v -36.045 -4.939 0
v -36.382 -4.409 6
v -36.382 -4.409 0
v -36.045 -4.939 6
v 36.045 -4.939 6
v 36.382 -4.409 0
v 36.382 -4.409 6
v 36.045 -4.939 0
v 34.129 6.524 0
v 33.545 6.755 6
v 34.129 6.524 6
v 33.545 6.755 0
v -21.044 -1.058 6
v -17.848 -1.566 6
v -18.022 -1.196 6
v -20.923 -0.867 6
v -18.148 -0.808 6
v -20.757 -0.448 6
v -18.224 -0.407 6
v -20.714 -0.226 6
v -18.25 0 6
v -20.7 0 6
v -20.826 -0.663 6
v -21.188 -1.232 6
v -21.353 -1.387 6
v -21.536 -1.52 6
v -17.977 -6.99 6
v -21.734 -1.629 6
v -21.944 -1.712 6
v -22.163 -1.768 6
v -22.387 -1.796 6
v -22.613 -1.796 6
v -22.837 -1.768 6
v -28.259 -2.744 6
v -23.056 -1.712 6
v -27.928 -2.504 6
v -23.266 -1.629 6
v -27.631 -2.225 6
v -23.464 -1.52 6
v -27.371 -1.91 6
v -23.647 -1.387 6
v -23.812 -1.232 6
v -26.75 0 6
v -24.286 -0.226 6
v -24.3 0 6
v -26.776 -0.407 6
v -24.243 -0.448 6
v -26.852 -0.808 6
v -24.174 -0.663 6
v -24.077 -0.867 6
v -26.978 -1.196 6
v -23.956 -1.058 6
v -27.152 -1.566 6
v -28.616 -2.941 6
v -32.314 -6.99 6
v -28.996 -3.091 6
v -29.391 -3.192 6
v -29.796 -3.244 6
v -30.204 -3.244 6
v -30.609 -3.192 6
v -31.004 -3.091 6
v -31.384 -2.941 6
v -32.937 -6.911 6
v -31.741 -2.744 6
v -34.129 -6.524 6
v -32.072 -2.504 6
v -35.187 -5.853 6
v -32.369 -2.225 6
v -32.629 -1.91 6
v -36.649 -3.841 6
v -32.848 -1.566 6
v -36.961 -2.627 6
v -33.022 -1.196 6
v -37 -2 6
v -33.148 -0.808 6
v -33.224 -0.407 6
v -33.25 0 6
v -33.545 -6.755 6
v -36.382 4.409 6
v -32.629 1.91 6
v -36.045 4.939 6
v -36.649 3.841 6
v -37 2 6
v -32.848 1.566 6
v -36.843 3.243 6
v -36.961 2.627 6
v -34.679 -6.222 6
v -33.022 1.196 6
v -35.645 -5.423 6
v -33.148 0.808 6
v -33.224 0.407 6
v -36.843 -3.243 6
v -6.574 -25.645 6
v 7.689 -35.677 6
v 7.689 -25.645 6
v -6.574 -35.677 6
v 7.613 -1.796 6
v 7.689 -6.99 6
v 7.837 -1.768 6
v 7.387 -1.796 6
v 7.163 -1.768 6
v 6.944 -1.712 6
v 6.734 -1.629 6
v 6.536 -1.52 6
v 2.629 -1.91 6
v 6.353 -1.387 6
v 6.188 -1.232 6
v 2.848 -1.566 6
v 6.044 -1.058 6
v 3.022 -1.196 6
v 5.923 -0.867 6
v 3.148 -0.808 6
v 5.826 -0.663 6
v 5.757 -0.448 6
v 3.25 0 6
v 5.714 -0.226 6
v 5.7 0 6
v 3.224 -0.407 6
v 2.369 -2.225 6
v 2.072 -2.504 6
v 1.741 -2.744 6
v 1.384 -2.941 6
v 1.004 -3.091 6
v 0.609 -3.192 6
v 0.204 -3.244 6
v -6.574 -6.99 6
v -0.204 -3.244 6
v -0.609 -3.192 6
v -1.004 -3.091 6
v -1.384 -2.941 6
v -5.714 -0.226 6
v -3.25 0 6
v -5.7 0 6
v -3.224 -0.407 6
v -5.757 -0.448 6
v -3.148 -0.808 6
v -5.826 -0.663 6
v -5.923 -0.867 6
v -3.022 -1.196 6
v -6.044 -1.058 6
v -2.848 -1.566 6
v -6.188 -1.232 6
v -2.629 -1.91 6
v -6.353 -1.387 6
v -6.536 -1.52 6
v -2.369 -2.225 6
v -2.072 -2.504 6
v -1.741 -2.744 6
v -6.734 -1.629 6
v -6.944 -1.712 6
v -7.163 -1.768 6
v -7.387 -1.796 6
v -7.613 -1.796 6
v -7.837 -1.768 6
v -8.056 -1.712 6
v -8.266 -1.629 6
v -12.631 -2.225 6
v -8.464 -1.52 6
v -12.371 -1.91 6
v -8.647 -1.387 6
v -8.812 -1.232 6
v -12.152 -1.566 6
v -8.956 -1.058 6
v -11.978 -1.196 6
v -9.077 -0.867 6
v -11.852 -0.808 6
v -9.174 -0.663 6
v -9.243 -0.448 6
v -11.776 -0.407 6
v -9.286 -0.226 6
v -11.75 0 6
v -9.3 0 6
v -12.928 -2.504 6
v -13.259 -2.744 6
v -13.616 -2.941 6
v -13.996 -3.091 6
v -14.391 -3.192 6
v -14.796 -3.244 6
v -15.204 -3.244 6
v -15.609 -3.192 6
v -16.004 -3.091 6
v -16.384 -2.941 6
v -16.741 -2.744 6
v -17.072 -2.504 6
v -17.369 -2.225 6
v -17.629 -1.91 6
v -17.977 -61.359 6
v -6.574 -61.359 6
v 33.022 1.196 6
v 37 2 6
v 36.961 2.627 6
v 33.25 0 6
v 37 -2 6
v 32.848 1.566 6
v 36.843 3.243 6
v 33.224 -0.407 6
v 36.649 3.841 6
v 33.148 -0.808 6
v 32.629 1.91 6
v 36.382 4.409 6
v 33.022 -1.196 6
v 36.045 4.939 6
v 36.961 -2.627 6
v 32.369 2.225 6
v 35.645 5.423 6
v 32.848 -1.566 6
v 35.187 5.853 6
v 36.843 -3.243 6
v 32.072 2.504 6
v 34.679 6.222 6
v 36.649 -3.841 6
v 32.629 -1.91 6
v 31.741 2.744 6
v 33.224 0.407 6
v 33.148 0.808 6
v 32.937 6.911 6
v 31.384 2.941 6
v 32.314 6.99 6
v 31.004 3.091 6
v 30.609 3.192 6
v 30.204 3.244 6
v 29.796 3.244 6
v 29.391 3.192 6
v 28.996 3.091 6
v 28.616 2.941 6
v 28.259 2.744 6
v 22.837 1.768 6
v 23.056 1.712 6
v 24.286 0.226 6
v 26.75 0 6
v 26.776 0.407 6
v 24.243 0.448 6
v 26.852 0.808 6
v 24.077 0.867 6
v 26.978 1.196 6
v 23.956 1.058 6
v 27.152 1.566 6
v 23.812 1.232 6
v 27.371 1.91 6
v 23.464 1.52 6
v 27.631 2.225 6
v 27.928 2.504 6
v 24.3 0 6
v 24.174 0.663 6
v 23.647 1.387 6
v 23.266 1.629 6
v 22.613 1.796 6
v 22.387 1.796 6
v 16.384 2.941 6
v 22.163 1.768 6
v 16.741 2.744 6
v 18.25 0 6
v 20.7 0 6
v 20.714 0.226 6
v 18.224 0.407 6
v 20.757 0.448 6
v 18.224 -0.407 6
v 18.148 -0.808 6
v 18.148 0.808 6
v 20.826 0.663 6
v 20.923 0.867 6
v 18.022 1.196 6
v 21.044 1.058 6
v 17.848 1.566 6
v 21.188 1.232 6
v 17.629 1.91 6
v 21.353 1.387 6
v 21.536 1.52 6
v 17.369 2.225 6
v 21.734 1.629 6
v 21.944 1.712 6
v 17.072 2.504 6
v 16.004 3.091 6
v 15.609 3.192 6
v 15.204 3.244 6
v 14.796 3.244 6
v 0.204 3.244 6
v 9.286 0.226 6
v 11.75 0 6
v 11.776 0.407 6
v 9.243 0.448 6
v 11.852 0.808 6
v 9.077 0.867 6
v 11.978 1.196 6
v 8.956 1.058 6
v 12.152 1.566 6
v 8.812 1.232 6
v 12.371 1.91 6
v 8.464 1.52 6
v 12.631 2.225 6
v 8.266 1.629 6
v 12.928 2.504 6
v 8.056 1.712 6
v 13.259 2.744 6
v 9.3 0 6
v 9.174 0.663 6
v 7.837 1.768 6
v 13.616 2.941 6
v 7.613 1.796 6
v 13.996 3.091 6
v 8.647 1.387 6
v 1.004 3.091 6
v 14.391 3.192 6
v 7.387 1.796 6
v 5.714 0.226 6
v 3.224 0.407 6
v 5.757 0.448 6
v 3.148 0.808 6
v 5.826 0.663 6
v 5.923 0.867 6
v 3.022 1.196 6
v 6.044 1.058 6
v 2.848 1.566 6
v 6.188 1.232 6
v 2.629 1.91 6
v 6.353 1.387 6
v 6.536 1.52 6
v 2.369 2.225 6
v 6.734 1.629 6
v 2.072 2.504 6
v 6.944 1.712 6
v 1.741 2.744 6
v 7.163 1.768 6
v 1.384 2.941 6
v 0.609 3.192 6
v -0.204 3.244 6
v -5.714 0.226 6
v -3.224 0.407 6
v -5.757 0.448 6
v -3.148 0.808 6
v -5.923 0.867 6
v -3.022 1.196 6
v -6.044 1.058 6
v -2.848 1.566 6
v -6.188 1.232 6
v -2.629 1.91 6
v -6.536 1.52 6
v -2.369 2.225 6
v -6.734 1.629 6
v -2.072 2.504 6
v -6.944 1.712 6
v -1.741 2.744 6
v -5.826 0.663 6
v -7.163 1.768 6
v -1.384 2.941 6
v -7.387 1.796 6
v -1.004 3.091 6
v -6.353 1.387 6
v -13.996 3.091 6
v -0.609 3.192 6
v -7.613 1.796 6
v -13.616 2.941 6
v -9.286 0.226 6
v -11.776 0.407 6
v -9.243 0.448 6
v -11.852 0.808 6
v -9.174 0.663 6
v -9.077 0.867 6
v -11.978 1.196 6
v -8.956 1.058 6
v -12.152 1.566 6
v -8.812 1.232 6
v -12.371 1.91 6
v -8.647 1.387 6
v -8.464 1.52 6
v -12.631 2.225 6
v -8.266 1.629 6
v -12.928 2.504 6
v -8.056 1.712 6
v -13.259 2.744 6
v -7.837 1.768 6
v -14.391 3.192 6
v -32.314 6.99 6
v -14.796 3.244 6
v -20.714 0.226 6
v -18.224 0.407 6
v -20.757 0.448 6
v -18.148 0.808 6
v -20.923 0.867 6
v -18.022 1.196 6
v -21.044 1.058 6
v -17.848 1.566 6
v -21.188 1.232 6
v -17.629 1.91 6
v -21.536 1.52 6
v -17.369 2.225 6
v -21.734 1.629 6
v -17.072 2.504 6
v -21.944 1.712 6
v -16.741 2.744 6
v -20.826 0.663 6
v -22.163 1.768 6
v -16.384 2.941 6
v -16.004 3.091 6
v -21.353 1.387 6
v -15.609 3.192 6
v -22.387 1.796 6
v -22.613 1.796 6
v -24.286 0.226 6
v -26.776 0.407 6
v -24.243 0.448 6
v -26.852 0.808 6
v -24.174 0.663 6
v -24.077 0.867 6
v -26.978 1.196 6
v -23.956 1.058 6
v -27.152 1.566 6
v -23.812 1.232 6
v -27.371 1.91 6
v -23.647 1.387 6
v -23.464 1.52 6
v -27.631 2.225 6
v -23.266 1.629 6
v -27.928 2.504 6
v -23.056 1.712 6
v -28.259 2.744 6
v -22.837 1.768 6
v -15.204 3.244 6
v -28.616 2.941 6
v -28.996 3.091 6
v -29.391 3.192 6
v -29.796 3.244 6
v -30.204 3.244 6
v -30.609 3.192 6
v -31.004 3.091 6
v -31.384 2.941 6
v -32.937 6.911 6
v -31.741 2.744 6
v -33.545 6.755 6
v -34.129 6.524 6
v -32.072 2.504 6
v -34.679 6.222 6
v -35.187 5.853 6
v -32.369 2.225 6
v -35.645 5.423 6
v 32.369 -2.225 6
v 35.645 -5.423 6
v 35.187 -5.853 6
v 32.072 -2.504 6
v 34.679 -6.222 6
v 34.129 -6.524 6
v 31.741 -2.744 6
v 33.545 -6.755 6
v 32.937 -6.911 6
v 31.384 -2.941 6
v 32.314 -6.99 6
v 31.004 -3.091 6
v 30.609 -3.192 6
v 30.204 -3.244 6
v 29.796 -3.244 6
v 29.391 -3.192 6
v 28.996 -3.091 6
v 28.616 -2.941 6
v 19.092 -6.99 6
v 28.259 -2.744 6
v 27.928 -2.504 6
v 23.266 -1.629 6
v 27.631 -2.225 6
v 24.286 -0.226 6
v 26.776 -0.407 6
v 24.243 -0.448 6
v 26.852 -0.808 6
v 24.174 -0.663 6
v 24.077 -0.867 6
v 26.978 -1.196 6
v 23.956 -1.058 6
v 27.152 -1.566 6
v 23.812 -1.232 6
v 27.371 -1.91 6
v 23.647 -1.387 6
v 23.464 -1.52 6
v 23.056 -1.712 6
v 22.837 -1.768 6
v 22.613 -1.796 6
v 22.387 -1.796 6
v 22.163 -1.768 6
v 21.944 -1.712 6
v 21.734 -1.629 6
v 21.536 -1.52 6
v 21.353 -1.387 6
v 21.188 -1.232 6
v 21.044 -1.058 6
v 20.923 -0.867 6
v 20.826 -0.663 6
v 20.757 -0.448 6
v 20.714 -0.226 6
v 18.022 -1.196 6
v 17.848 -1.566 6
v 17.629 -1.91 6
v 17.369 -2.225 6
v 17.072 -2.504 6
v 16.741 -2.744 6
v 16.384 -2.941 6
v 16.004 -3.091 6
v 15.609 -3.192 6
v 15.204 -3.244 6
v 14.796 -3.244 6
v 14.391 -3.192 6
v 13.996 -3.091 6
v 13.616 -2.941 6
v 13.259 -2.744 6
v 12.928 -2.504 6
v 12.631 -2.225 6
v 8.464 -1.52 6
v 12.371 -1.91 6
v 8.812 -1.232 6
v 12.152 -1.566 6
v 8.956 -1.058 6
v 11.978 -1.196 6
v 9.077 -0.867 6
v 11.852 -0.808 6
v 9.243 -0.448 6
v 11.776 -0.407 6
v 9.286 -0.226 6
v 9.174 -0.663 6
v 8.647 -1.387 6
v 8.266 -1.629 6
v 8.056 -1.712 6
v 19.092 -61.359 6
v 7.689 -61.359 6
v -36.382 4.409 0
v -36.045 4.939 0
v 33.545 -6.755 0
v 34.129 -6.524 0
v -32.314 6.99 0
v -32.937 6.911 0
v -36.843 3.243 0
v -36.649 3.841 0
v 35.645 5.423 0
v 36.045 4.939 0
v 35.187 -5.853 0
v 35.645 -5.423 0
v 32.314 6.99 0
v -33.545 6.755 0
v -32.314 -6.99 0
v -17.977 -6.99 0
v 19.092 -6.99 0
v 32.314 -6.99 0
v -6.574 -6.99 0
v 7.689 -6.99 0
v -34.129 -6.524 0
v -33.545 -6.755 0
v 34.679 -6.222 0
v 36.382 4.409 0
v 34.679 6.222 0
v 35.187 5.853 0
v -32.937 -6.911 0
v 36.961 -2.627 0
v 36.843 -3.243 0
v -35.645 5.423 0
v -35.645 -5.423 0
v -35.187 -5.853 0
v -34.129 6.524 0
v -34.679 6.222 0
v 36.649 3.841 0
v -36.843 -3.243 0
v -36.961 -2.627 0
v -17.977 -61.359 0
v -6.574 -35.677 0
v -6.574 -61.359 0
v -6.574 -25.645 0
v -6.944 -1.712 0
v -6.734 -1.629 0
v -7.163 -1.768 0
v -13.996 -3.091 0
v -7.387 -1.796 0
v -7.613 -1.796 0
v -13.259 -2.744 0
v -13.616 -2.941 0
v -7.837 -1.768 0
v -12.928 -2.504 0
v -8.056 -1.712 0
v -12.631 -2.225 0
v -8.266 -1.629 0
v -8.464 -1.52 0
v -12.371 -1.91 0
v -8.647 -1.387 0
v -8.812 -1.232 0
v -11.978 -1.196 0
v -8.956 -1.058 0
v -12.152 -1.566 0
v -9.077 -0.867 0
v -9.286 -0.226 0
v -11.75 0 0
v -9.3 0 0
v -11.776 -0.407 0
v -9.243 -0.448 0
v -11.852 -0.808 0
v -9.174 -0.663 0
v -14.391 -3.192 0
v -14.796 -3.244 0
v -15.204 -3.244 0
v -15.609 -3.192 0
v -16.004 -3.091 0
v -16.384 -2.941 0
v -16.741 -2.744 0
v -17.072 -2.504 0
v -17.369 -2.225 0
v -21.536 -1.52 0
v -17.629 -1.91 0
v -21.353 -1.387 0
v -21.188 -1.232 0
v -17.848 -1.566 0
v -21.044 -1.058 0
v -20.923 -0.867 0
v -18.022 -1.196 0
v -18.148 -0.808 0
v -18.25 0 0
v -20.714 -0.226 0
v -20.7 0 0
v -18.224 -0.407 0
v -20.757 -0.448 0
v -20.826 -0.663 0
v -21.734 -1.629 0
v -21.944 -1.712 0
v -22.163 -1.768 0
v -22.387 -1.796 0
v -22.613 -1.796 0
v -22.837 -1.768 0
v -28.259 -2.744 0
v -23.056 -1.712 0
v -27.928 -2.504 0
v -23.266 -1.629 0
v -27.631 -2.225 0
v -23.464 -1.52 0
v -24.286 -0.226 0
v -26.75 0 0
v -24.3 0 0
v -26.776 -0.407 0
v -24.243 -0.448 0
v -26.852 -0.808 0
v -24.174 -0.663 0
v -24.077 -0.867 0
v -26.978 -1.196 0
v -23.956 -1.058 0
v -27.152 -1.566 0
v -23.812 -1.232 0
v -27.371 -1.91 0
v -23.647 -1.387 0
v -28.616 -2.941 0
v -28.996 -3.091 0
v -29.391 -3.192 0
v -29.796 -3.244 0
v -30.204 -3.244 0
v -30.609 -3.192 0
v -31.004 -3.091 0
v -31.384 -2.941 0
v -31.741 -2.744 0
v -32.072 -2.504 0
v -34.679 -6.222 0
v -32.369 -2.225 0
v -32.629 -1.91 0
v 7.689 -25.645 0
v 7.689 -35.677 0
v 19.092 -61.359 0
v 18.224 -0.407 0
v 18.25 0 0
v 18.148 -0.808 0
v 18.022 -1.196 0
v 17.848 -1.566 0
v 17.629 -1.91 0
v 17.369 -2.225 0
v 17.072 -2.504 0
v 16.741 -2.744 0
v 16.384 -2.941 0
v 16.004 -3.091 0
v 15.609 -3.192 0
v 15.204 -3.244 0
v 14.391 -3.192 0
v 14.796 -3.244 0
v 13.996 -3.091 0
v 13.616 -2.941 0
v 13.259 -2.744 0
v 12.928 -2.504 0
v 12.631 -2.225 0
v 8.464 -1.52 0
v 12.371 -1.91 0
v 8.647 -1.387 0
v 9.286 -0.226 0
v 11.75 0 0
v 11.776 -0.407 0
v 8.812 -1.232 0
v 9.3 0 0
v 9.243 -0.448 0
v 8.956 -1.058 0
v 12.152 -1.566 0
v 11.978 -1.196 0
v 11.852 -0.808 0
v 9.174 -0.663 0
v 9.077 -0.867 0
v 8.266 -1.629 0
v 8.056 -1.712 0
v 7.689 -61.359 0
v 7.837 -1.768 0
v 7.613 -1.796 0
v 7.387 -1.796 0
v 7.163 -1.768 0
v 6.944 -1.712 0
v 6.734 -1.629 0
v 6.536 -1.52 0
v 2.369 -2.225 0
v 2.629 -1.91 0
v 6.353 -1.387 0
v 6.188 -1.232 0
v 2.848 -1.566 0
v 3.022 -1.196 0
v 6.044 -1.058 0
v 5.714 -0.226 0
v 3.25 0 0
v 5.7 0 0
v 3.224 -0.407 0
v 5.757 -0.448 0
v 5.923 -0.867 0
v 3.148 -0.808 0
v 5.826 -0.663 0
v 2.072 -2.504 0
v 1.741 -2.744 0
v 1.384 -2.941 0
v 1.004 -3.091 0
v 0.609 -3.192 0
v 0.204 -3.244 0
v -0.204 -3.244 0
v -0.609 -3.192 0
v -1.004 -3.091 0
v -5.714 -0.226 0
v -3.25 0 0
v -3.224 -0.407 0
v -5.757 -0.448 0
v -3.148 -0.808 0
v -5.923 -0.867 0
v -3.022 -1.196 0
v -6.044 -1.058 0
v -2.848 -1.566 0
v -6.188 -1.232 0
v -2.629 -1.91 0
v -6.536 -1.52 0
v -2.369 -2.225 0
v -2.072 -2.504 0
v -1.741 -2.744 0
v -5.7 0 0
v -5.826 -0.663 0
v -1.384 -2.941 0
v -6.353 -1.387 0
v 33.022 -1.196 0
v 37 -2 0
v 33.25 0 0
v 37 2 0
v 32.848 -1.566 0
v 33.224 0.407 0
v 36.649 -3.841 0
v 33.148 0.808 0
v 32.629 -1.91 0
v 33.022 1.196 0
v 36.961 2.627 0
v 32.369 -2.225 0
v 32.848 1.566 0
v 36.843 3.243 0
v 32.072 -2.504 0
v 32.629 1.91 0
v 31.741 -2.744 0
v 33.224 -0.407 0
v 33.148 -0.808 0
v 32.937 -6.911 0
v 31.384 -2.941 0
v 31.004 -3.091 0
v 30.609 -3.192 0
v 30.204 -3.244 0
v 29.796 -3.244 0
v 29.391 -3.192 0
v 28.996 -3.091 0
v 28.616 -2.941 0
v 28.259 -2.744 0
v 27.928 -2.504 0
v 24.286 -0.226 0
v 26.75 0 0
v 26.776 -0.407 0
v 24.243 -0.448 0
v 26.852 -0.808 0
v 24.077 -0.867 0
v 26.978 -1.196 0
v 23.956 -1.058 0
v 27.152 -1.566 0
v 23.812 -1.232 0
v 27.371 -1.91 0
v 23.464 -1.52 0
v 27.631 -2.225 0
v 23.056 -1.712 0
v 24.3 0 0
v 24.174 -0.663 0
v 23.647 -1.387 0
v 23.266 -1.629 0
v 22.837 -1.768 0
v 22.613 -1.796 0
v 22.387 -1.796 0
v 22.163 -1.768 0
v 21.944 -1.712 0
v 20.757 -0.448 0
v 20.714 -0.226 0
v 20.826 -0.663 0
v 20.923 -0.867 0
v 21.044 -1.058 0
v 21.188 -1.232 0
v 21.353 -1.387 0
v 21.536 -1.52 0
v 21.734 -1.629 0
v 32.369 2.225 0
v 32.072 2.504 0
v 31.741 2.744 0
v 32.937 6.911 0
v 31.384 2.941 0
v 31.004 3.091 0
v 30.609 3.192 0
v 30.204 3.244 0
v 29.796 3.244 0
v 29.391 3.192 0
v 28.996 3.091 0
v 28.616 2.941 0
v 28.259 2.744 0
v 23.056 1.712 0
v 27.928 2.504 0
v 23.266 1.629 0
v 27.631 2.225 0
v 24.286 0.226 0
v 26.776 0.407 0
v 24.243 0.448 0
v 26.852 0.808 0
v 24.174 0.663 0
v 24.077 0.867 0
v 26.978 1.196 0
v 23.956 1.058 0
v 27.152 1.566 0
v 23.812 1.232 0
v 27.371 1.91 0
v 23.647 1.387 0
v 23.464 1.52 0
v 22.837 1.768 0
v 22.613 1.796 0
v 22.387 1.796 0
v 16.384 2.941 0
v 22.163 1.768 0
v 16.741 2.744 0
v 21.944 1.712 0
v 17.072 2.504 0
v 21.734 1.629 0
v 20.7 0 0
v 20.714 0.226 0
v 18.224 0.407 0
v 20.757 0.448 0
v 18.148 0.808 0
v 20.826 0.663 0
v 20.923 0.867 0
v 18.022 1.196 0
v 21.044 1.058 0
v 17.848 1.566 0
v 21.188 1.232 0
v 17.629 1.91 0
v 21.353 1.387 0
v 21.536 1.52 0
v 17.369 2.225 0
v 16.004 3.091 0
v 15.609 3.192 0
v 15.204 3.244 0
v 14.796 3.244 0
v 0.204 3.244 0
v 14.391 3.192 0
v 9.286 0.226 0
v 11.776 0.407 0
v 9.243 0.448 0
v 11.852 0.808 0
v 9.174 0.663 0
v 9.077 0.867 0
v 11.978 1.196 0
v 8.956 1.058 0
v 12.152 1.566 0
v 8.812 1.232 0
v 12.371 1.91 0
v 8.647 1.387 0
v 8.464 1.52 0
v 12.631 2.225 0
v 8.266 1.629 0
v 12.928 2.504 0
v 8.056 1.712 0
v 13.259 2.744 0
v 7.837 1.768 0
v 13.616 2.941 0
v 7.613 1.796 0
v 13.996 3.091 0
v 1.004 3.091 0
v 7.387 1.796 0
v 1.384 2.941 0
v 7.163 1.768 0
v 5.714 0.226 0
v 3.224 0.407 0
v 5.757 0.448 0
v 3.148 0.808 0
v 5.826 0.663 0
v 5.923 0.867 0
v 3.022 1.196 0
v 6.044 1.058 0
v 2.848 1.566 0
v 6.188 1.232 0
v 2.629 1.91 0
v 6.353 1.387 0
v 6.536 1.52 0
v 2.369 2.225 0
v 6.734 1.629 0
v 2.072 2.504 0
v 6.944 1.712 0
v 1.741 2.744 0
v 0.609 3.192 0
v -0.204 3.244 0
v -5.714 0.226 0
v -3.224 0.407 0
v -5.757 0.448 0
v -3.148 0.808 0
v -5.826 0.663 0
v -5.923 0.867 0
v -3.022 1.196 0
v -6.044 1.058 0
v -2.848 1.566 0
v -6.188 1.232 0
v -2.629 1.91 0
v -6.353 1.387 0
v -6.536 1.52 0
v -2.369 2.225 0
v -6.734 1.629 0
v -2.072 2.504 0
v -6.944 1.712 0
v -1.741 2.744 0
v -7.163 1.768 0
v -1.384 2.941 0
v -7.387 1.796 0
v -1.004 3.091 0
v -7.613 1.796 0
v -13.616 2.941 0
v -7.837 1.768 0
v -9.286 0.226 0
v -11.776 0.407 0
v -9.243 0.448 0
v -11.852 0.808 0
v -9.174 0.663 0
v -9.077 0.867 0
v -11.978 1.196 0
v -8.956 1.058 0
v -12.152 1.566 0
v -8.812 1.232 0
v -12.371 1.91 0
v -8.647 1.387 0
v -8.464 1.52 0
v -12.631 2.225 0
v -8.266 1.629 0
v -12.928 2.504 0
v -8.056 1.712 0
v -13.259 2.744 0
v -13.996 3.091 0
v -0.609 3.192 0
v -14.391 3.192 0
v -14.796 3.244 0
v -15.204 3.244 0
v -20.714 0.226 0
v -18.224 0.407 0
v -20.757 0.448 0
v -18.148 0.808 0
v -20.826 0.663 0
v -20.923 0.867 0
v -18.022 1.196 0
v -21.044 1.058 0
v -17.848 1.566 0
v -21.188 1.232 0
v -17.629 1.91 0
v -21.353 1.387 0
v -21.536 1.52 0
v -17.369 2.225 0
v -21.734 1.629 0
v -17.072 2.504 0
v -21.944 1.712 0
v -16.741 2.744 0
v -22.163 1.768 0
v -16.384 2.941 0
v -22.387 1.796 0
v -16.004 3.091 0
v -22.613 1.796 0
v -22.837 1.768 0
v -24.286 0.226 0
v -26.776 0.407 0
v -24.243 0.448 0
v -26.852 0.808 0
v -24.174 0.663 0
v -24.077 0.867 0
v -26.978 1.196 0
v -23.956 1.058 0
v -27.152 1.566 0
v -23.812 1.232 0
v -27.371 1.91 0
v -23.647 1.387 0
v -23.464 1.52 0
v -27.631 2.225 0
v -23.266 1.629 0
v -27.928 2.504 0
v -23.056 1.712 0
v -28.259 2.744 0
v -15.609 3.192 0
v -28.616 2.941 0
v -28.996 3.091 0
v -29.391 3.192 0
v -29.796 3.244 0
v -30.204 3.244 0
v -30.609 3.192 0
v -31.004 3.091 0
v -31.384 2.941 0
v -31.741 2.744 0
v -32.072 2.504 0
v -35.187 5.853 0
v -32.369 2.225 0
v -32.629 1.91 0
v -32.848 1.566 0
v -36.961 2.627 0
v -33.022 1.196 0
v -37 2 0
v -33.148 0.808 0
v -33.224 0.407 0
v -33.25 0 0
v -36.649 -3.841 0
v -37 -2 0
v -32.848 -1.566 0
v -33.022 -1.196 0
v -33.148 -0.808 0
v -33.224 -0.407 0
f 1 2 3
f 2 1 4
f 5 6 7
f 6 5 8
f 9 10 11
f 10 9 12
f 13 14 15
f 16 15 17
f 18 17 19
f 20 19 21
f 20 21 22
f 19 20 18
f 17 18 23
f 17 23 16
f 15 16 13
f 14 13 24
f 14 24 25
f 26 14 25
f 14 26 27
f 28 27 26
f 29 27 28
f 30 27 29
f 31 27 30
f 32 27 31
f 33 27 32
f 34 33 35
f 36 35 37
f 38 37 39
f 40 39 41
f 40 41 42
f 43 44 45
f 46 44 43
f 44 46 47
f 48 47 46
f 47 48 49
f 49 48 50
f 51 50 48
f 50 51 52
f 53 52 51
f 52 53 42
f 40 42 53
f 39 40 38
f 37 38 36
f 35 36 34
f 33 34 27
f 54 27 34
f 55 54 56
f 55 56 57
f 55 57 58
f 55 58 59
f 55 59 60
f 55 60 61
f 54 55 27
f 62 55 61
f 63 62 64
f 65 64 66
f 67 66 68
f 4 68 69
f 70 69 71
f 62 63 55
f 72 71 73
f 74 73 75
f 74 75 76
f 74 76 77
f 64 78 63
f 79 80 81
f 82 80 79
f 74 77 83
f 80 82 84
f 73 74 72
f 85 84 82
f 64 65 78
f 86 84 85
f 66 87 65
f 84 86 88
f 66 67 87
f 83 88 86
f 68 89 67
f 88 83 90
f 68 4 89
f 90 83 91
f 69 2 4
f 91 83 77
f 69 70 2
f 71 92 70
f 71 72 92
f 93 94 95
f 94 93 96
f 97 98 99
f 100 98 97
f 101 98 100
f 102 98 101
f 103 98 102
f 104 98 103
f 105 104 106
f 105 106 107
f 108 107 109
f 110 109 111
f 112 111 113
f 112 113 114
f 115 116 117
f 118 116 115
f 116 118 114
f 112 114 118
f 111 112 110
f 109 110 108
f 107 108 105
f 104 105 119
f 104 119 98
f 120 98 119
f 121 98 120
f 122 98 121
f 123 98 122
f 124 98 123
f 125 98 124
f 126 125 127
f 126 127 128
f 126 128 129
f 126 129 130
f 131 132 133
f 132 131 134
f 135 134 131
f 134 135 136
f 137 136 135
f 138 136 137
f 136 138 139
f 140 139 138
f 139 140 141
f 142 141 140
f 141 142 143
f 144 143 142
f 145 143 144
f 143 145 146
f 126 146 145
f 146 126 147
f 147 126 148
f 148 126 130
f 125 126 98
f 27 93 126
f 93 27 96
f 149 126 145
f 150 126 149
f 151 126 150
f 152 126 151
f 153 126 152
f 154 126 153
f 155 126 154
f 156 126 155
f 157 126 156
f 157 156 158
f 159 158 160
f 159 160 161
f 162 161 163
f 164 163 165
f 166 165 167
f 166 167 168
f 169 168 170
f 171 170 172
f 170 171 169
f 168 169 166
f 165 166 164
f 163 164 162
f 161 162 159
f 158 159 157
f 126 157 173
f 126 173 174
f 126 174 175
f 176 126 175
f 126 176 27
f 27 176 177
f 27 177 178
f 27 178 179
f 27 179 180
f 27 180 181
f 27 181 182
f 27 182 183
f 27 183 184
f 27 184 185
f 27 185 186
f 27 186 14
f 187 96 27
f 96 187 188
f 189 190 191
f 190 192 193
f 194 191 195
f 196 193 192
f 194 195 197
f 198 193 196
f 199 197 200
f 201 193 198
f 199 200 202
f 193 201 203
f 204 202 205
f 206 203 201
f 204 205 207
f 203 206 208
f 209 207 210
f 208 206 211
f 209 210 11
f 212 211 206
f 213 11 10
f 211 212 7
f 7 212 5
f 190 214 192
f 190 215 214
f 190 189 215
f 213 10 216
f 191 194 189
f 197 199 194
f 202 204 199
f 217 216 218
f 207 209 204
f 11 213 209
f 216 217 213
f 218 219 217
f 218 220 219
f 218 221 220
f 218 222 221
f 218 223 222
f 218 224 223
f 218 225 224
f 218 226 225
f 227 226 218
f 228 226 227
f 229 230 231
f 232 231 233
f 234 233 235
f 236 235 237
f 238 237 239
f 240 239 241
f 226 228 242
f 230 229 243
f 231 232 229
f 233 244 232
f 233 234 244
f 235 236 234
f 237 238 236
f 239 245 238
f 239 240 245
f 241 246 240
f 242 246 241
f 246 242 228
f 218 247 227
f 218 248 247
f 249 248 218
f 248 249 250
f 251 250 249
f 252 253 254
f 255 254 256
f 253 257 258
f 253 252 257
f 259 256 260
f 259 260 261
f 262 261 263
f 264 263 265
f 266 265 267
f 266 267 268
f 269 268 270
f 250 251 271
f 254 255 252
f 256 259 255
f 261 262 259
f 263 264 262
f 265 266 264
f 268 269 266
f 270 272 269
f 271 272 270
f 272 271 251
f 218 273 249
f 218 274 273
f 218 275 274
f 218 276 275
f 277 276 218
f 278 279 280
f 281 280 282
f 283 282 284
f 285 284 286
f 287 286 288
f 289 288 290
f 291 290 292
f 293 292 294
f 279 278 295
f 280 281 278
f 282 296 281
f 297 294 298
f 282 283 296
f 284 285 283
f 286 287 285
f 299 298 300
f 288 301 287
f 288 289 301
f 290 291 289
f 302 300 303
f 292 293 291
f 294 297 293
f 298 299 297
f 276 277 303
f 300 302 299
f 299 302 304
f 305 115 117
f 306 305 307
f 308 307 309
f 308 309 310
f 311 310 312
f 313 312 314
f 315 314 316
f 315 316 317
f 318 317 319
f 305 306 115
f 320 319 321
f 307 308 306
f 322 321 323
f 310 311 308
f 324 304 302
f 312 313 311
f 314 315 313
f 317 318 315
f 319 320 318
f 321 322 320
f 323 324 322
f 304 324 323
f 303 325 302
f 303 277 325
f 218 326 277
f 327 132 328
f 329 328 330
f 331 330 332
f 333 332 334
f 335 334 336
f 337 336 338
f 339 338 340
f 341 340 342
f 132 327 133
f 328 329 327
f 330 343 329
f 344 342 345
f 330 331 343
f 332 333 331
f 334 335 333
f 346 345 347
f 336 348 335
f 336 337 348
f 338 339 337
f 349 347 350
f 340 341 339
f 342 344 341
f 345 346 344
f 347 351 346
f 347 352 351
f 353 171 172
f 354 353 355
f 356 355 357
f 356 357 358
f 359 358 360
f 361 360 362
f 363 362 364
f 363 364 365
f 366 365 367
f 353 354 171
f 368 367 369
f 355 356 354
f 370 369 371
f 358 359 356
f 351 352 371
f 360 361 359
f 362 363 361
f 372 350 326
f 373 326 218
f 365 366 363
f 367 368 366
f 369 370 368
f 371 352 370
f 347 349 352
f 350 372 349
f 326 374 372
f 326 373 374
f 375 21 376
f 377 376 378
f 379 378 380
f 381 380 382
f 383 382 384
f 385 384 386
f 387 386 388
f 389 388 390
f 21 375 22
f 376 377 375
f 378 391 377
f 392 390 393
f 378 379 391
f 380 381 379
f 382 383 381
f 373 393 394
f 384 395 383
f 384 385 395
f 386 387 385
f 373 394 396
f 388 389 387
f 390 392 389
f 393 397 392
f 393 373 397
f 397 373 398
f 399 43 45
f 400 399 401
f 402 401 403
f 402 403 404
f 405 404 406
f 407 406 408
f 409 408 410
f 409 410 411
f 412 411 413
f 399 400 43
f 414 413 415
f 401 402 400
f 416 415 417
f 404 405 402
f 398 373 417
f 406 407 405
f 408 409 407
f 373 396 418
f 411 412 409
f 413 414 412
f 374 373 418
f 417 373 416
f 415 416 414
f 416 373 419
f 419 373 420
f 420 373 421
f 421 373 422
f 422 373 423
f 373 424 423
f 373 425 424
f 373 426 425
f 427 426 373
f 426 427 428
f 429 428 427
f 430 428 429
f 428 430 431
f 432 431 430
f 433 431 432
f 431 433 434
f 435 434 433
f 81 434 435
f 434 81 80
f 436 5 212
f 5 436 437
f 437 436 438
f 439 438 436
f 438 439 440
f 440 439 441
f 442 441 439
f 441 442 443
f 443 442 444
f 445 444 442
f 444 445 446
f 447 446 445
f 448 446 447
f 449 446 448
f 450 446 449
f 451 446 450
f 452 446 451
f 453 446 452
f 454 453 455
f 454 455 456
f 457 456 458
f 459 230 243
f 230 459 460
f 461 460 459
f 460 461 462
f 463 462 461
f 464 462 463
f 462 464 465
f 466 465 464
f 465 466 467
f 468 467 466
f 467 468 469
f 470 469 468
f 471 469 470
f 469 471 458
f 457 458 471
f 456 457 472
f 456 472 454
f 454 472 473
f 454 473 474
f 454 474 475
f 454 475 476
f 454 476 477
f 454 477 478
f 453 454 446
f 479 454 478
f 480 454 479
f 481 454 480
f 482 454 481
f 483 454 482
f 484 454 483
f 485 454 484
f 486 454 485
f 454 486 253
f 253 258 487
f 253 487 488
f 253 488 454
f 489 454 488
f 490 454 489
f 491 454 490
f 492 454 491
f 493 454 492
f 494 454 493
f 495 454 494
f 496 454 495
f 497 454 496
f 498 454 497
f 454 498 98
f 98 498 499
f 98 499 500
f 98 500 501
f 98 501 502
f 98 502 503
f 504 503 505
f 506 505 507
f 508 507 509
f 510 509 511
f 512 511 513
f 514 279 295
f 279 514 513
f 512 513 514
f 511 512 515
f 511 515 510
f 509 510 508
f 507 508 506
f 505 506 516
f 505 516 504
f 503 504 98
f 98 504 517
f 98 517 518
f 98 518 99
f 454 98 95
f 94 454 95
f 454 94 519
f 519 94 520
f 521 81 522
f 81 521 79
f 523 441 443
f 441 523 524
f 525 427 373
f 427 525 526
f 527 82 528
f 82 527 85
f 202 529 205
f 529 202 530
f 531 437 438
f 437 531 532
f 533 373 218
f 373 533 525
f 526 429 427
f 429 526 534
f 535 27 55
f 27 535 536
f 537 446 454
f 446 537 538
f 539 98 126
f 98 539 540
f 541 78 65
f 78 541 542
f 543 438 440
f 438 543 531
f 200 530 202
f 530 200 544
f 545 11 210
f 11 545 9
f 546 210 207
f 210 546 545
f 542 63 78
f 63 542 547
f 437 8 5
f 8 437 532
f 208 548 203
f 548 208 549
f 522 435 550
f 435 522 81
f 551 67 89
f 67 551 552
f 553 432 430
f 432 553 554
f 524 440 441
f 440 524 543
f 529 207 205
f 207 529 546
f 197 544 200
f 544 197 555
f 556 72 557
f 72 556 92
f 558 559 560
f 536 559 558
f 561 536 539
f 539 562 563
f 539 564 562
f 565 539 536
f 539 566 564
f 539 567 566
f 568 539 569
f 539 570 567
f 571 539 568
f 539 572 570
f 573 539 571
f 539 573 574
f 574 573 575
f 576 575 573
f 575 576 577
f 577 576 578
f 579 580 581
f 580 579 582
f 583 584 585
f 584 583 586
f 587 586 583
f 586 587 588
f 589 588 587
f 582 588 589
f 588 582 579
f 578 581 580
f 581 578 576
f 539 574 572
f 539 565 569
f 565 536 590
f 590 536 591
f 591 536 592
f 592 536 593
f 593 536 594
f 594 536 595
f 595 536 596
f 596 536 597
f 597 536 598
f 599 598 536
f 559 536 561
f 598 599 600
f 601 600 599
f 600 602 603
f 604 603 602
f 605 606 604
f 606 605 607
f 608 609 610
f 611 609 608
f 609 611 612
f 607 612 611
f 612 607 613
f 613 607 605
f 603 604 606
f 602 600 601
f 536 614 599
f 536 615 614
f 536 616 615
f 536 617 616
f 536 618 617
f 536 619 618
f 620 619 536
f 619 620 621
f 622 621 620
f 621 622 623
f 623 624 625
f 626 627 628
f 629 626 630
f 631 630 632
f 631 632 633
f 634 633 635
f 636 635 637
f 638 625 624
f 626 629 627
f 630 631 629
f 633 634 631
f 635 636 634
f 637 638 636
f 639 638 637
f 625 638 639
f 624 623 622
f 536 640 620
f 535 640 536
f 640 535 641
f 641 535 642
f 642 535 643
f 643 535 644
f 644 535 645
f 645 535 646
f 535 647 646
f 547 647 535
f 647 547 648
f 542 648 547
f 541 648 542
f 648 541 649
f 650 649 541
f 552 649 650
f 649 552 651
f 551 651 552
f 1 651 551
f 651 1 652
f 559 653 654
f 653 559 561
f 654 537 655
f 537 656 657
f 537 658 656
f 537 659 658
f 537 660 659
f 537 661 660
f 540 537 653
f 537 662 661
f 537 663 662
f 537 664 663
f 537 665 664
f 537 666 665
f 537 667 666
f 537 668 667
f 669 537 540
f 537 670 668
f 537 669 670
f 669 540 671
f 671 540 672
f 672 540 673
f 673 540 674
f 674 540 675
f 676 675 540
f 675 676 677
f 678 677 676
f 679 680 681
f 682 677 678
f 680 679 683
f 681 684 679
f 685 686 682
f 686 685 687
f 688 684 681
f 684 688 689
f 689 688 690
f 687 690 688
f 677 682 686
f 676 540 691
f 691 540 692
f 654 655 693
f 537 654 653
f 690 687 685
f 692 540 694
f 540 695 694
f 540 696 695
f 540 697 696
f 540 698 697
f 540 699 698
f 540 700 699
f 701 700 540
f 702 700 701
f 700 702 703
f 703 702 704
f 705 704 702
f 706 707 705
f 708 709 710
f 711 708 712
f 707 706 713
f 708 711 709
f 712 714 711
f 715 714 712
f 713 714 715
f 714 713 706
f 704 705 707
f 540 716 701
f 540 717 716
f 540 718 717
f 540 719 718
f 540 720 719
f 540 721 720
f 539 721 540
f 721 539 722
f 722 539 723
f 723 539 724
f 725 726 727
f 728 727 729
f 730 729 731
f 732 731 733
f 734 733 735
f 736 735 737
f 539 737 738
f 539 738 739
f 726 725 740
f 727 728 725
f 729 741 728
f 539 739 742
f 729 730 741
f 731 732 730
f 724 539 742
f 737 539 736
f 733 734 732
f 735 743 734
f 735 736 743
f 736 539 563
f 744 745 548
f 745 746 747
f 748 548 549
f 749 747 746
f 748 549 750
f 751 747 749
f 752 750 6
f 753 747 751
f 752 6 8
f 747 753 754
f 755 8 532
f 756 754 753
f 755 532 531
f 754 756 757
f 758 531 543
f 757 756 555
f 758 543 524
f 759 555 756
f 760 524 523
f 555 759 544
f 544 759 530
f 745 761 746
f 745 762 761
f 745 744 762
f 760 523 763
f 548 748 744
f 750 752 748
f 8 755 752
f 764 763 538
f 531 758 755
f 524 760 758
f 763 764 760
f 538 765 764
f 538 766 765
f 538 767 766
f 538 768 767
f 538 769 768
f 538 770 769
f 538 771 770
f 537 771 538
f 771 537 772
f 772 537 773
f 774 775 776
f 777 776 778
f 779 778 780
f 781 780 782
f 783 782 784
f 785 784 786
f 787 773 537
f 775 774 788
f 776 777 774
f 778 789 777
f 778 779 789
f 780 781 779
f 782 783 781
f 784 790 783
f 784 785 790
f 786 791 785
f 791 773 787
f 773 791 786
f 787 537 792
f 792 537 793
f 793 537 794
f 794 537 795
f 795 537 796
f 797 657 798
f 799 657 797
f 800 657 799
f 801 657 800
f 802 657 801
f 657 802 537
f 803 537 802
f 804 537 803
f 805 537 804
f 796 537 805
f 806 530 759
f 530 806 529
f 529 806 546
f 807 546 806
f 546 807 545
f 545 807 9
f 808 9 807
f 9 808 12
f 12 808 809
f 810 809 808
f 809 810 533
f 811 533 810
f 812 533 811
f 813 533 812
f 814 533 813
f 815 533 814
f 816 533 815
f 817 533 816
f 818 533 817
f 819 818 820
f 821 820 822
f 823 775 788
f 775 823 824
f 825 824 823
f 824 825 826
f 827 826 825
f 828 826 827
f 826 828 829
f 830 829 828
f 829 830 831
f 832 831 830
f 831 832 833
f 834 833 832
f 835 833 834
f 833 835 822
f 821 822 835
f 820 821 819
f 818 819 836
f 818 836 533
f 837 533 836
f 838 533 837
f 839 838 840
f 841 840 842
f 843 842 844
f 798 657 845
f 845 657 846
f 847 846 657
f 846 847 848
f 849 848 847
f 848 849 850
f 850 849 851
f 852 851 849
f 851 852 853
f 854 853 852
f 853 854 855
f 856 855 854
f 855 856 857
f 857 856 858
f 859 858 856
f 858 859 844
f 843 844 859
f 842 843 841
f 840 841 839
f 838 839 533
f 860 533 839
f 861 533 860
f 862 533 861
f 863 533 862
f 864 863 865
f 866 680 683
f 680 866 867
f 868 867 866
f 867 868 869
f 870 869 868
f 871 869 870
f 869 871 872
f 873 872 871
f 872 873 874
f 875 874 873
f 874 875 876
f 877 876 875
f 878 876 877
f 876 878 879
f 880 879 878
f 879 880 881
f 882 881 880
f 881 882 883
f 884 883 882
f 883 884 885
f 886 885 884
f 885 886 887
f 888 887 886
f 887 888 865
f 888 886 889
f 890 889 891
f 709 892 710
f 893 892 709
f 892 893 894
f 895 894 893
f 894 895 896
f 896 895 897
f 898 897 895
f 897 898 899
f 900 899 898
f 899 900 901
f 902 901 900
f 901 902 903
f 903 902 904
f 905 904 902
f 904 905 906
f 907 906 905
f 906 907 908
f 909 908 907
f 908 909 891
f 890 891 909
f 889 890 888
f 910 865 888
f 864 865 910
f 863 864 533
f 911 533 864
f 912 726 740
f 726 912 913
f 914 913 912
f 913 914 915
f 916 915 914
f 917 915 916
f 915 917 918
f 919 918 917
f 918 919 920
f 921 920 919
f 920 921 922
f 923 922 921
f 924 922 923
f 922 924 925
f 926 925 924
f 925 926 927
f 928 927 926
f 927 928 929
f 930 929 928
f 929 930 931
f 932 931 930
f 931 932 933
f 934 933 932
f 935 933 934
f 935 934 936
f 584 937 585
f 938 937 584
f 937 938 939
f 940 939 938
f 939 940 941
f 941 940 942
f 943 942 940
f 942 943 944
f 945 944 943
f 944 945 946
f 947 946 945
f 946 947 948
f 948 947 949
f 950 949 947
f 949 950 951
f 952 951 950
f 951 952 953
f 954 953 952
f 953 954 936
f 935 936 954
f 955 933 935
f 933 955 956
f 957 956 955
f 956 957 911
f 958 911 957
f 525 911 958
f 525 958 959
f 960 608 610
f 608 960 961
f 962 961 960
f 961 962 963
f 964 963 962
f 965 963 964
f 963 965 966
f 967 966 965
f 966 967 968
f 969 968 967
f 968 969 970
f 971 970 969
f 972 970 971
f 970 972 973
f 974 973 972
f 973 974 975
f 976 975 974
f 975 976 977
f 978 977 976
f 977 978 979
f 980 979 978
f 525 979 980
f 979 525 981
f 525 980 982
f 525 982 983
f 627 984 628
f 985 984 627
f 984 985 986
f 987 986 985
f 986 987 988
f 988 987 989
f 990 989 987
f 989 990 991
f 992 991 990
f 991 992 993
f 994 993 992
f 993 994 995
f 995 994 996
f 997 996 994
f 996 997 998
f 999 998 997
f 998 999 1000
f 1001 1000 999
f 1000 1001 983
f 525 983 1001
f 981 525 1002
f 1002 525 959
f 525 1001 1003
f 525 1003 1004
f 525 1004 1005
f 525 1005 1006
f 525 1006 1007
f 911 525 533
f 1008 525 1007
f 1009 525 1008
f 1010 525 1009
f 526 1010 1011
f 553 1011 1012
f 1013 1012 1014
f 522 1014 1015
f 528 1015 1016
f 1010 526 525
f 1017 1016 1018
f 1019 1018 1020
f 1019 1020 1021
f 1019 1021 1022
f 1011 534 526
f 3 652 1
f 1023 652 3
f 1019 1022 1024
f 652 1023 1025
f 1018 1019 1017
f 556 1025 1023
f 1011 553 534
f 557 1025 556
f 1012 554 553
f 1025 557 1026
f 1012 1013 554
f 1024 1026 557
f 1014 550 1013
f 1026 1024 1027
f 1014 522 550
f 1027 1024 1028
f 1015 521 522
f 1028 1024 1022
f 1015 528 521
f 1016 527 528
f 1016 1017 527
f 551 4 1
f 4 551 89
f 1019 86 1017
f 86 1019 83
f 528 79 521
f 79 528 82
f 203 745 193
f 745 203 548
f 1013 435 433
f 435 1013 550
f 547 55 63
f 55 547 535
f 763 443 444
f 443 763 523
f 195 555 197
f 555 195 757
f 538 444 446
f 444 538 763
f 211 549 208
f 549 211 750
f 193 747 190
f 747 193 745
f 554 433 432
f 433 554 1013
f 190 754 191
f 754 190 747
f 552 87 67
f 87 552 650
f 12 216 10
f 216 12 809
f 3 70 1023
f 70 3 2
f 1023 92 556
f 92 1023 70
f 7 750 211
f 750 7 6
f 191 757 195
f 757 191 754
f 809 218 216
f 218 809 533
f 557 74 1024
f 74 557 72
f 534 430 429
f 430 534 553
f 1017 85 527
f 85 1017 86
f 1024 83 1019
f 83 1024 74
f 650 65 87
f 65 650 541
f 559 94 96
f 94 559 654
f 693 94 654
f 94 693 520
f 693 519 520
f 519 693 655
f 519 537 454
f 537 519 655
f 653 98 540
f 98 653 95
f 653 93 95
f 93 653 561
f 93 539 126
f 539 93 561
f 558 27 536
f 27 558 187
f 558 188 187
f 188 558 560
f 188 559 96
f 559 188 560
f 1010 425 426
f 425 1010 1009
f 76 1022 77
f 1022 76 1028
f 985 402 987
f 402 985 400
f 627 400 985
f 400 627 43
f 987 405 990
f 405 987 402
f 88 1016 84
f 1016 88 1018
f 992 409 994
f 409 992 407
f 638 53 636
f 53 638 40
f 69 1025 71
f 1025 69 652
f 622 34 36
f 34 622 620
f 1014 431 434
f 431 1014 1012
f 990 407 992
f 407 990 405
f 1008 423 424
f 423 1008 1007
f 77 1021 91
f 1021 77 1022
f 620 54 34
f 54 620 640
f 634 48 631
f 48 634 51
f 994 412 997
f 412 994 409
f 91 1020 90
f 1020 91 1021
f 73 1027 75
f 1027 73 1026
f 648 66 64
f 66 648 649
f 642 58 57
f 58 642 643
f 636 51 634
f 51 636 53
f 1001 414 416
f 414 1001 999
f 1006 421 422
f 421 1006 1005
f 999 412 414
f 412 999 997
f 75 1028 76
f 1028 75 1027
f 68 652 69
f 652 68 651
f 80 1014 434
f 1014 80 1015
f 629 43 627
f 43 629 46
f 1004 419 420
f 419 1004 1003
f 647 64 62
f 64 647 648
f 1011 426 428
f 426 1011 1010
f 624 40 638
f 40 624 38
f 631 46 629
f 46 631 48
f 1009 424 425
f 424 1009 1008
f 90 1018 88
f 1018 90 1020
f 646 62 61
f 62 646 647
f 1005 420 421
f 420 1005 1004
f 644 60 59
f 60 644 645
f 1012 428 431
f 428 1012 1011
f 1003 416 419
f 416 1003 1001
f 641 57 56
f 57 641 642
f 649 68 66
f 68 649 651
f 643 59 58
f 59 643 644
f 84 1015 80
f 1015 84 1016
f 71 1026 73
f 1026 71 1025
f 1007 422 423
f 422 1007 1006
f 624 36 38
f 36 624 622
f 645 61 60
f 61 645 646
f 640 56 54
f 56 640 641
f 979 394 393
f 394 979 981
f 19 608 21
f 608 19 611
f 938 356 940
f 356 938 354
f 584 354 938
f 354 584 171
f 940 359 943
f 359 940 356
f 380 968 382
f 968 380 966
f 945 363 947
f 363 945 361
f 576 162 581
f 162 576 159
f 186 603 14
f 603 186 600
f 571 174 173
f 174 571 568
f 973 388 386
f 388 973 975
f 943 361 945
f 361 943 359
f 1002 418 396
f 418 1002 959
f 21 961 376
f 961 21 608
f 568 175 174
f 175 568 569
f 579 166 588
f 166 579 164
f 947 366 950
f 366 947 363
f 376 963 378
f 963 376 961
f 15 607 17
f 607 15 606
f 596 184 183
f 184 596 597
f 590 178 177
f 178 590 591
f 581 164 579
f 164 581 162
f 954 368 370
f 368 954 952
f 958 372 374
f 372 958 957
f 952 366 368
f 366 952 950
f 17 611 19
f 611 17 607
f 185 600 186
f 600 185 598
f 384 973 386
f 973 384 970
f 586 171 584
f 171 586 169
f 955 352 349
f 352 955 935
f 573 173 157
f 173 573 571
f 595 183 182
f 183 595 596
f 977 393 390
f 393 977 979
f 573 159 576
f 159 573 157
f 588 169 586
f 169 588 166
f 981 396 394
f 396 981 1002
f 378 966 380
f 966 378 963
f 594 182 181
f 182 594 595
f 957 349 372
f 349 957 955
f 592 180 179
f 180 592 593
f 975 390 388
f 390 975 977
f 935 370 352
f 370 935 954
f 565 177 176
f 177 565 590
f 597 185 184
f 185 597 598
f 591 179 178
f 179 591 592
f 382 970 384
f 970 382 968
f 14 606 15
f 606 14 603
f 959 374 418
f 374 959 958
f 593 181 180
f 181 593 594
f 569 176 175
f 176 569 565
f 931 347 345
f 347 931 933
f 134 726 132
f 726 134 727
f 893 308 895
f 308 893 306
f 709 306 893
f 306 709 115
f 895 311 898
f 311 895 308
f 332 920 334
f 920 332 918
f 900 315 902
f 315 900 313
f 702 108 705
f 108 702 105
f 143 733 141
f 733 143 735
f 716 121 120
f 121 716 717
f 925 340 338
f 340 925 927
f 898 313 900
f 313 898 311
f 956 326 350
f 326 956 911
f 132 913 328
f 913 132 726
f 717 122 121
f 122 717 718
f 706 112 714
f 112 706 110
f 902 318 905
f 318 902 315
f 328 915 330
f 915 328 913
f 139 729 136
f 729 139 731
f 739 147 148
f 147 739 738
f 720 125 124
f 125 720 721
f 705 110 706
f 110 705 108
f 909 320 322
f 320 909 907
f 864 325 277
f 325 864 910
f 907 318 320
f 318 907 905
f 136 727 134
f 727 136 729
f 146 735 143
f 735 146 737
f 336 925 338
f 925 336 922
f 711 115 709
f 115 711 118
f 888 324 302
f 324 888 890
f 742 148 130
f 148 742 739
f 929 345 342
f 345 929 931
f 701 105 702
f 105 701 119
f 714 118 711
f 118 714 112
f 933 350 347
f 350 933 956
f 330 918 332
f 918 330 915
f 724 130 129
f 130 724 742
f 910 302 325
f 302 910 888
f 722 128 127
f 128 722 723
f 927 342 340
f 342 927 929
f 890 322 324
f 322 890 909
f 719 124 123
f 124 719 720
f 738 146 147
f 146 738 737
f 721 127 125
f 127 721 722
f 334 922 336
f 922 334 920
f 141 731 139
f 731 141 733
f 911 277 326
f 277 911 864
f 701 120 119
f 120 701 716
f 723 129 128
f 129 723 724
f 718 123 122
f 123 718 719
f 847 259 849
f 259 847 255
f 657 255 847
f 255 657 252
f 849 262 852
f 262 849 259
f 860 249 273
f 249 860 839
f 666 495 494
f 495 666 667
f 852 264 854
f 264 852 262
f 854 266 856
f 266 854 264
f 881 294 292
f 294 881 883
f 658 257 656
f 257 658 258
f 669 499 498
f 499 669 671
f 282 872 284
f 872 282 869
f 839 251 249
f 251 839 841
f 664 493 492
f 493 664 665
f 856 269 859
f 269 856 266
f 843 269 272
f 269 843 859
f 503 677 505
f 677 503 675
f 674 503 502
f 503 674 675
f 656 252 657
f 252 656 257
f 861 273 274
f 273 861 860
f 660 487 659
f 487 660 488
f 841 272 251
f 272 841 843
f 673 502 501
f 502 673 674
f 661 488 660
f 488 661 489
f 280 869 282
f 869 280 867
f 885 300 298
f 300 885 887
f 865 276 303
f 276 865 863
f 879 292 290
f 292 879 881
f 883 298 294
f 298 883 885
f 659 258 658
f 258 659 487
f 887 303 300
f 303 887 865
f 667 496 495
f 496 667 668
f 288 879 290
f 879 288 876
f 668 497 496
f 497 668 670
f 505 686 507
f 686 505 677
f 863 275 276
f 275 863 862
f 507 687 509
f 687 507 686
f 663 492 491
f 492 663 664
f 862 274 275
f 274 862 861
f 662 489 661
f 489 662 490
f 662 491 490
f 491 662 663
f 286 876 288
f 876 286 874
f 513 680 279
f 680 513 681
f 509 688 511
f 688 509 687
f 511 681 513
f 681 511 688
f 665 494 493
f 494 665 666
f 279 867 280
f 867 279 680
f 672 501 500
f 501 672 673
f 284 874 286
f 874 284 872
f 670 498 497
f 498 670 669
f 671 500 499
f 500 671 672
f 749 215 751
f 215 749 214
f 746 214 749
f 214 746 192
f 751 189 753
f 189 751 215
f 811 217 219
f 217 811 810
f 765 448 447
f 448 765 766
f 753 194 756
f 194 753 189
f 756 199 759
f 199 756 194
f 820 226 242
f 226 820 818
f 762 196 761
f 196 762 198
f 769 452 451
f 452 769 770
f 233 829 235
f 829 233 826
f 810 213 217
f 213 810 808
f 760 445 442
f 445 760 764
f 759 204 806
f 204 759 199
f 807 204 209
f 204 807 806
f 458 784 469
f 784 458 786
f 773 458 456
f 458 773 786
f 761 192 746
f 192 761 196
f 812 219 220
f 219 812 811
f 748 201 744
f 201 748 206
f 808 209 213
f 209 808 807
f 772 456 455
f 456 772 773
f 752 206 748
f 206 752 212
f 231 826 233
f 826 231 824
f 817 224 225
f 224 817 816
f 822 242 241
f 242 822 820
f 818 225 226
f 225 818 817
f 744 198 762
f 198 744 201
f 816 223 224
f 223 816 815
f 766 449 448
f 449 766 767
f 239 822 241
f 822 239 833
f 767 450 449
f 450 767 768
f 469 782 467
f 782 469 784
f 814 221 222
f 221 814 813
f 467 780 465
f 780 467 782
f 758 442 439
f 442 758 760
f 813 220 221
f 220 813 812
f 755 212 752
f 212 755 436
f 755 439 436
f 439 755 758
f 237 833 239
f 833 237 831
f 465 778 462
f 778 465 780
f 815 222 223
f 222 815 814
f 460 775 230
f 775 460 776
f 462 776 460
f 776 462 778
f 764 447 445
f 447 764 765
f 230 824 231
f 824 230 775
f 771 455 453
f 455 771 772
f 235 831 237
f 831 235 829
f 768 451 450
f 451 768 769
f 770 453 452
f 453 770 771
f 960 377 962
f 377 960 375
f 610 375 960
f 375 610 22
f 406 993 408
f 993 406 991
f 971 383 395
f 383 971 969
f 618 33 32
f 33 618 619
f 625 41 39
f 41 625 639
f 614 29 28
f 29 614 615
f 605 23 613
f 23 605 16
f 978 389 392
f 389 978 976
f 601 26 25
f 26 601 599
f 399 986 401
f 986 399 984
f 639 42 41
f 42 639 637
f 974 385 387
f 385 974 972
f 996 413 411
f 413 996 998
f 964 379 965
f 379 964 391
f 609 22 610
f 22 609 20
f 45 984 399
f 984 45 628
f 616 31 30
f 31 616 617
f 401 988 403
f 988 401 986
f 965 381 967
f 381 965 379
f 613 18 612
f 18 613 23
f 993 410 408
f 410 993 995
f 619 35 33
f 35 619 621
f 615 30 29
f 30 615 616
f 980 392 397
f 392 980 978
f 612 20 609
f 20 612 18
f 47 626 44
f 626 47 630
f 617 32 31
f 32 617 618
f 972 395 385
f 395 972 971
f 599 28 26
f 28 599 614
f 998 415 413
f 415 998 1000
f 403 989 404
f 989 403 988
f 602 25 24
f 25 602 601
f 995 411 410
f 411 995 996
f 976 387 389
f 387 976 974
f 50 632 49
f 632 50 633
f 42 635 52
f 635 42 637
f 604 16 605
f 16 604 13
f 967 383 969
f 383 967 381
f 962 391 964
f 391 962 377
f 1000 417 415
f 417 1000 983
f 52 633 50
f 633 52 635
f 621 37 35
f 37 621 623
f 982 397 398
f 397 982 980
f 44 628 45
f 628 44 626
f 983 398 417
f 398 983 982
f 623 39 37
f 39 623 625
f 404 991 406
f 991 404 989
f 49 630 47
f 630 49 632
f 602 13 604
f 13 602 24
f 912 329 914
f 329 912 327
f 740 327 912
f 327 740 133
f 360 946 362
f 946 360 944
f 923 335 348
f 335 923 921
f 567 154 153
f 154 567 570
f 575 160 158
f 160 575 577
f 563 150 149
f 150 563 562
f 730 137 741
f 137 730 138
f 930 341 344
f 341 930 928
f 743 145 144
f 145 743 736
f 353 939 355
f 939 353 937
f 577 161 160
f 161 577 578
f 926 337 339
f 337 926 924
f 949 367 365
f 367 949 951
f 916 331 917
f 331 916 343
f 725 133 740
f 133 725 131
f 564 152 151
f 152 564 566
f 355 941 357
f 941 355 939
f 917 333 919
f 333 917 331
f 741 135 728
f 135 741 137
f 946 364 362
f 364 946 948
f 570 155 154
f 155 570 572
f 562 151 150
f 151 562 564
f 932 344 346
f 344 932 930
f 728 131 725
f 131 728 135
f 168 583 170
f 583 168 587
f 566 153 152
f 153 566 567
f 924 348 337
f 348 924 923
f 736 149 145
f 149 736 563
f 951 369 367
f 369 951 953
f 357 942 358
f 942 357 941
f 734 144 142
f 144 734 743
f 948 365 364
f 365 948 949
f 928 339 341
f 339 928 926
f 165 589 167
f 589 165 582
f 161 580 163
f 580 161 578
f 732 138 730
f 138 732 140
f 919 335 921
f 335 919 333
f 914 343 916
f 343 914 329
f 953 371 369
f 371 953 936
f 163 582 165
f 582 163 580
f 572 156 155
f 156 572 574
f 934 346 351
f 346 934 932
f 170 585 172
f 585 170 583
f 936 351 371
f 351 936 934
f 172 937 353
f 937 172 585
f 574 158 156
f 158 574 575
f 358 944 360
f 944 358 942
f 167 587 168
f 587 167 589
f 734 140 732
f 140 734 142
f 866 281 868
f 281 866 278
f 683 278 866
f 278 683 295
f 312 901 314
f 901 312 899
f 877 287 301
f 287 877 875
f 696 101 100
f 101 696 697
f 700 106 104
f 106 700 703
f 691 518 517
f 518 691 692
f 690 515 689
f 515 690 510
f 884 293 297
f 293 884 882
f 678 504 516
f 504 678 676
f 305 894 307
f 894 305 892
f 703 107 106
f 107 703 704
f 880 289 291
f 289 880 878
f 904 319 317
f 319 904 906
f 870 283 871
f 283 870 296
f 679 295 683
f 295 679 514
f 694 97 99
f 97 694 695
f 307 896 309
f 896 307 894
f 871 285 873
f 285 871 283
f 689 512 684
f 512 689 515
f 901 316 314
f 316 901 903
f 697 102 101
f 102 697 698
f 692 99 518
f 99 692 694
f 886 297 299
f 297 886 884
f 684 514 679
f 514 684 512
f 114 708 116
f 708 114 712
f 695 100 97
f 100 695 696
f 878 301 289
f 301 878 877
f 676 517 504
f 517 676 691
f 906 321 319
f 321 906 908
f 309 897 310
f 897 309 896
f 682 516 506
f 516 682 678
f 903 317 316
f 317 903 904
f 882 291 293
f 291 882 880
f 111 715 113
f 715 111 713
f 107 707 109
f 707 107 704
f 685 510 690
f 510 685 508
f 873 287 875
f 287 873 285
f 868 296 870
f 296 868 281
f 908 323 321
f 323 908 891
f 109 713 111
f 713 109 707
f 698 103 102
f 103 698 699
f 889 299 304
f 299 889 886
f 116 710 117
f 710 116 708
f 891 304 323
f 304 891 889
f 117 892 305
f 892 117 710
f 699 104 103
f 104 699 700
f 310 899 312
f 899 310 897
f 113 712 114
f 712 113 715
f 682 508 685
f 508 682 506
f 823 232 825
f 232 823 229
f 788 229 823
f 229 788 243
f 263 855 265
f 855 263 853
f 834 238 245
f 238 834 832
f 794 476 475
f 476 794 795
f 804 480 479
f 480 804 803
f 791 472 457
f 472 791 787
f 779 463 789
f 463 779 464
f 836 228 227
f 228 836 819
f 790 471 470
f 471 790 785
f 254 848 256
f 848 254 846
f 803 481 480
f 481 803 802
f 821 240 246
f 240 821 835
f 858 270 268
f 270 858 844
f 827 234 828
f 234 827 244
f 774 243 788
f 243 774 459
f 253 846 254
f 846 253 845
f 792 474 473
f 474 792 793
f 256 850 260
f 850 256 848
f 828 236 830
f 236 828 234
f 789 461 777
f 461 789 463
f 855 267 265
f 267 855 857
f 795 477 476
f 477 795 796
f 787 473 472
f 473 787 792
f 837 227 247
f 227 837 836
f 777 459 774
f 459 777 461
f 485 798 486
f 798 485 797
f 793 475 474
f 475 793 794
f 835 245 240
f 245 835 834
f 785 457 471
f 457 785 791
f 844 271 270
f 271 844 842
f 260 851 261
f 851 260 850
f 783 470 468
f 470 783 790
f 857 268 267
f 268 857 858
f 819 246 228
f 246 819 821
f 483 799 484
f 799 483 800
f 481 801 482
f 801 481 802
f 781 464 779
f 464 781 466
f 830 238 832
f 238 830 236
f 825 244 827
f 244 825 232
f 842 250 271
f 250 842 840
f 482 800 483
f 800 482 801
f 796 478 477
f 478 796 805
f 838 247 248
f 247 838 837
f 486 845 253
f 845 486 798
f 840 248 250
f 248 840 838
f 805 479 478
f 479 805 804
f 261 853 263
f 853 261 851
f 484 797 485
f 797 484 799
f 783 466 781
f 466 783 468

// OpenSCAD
$fn = 50;


difference() {
	union() {
		hull() {
			translate(v = [-32.0000000000, 2.0000000000, 0]) {
				cylinder(h = 6, r = 5);
			}
			translate(v = [32.0000000000, 2.0000000000, 0]) {
				cylinder(h = 6, r = 5);
			}
			translate(v = [-32.0000000000, -2.0000000000, 0]) {
				cylinder(h = 6, r = 5);
			}
			translate(v = [32.0000000000, -2.0000000000, 0]) {
				cylinder(h = 6, r = 5);
			}
		}
		translate(v = [0, -5, 0]) {
			linear_extrude(height = 6) {
				text(font = "DejaVu Sans Mono:style=Bold", halign = "center", size = 57.0000000000, text = "H", valign = "top");
			}
		}
	}
	union() {
		translate(v = [-30.0000000000, 0.0000000000, 0]) {
			translate(v = [0, 0, -100]) {
				cylinder(h = 200, r = 3.2500000000);
			}
		}
		translate(v = [-15.0000000000, 0.0000000000, 0]) {
			translate(v = [0, 0, -100]) {
				cylinder(h = 200, r = 3.2500000000);
			}
		}
		translate(v = [0, 0, -100]) {
			cylinder(h = 200, r = 3.2500000000);
		}
		translate(v = [15.0000000000, 0.0000000000, 0]) {
			translate(v = [0, 0, -100]) {
				cylinder(h = 200, r = 3.2500000000);
			}
		}
		translate(v = [30.0000000000, 0.0000000000, 0]) {
			translate(v = [0, 0, -100]) {
				cylinder(h = 200, r = 3.2500000000);
			}
		}
		translate(v = [-30.0000000000, 0.0000000000, 0]) {
			translate(v = [0, 0, -100]) {
				cylinder(h = 200, r = 1.8000000000);
			}
		}
		translate(v = [-22.5000000000, 0.0000000000, 0]) {
			translate(v = [0, 0, -100]) {
				cylinder(h = 200, r = 1.8000000000);
			}
		}
		translate(v = [-15.0000000000, 0.0000000000, 0]) {
			translate(v = [0, 0, -100]) {
				cylinder(h = 200, r = 1.8000000000);
			}
		}
		translate(v = [-7.5000000000, 0.0000000000, 0]) {
			translate(v = [0, 0, -100]) {
				cylinder(h = 200, r = 1.8000000000);
			}
		}
		translate(v = [0, 0, -100]) {
			cylinder(h = 200, r = 1.8000000000);
		}
		translate(v = [7.5000000000, 0.0000000000, 0]) {
			translate(v = [0, 0, -100]) {
				cylinder(h = 200, r = 1.8000000000);
			}
		}
		translate(v = [15.0000000000, 0.0000000000, 0]) {
			translate(v = [0, 0, -100]) {
				cylinder(h = 200, r = 1.8000000000);
			}
		}
		translate(v = [22.5000000000, 0.0000000000, 0]) {
			translate(v = [0, 0, -100]) {
				cylinder(h = 200, r = 1.8000000000);
			}
		}
		translate(v = [30.0000000000, 0.0000000000, 0]) {
			translate(v = [0, 0, -100]) {
				cylinder(h = 200, r = 1.8000000000);
			}
		}
	}
}
